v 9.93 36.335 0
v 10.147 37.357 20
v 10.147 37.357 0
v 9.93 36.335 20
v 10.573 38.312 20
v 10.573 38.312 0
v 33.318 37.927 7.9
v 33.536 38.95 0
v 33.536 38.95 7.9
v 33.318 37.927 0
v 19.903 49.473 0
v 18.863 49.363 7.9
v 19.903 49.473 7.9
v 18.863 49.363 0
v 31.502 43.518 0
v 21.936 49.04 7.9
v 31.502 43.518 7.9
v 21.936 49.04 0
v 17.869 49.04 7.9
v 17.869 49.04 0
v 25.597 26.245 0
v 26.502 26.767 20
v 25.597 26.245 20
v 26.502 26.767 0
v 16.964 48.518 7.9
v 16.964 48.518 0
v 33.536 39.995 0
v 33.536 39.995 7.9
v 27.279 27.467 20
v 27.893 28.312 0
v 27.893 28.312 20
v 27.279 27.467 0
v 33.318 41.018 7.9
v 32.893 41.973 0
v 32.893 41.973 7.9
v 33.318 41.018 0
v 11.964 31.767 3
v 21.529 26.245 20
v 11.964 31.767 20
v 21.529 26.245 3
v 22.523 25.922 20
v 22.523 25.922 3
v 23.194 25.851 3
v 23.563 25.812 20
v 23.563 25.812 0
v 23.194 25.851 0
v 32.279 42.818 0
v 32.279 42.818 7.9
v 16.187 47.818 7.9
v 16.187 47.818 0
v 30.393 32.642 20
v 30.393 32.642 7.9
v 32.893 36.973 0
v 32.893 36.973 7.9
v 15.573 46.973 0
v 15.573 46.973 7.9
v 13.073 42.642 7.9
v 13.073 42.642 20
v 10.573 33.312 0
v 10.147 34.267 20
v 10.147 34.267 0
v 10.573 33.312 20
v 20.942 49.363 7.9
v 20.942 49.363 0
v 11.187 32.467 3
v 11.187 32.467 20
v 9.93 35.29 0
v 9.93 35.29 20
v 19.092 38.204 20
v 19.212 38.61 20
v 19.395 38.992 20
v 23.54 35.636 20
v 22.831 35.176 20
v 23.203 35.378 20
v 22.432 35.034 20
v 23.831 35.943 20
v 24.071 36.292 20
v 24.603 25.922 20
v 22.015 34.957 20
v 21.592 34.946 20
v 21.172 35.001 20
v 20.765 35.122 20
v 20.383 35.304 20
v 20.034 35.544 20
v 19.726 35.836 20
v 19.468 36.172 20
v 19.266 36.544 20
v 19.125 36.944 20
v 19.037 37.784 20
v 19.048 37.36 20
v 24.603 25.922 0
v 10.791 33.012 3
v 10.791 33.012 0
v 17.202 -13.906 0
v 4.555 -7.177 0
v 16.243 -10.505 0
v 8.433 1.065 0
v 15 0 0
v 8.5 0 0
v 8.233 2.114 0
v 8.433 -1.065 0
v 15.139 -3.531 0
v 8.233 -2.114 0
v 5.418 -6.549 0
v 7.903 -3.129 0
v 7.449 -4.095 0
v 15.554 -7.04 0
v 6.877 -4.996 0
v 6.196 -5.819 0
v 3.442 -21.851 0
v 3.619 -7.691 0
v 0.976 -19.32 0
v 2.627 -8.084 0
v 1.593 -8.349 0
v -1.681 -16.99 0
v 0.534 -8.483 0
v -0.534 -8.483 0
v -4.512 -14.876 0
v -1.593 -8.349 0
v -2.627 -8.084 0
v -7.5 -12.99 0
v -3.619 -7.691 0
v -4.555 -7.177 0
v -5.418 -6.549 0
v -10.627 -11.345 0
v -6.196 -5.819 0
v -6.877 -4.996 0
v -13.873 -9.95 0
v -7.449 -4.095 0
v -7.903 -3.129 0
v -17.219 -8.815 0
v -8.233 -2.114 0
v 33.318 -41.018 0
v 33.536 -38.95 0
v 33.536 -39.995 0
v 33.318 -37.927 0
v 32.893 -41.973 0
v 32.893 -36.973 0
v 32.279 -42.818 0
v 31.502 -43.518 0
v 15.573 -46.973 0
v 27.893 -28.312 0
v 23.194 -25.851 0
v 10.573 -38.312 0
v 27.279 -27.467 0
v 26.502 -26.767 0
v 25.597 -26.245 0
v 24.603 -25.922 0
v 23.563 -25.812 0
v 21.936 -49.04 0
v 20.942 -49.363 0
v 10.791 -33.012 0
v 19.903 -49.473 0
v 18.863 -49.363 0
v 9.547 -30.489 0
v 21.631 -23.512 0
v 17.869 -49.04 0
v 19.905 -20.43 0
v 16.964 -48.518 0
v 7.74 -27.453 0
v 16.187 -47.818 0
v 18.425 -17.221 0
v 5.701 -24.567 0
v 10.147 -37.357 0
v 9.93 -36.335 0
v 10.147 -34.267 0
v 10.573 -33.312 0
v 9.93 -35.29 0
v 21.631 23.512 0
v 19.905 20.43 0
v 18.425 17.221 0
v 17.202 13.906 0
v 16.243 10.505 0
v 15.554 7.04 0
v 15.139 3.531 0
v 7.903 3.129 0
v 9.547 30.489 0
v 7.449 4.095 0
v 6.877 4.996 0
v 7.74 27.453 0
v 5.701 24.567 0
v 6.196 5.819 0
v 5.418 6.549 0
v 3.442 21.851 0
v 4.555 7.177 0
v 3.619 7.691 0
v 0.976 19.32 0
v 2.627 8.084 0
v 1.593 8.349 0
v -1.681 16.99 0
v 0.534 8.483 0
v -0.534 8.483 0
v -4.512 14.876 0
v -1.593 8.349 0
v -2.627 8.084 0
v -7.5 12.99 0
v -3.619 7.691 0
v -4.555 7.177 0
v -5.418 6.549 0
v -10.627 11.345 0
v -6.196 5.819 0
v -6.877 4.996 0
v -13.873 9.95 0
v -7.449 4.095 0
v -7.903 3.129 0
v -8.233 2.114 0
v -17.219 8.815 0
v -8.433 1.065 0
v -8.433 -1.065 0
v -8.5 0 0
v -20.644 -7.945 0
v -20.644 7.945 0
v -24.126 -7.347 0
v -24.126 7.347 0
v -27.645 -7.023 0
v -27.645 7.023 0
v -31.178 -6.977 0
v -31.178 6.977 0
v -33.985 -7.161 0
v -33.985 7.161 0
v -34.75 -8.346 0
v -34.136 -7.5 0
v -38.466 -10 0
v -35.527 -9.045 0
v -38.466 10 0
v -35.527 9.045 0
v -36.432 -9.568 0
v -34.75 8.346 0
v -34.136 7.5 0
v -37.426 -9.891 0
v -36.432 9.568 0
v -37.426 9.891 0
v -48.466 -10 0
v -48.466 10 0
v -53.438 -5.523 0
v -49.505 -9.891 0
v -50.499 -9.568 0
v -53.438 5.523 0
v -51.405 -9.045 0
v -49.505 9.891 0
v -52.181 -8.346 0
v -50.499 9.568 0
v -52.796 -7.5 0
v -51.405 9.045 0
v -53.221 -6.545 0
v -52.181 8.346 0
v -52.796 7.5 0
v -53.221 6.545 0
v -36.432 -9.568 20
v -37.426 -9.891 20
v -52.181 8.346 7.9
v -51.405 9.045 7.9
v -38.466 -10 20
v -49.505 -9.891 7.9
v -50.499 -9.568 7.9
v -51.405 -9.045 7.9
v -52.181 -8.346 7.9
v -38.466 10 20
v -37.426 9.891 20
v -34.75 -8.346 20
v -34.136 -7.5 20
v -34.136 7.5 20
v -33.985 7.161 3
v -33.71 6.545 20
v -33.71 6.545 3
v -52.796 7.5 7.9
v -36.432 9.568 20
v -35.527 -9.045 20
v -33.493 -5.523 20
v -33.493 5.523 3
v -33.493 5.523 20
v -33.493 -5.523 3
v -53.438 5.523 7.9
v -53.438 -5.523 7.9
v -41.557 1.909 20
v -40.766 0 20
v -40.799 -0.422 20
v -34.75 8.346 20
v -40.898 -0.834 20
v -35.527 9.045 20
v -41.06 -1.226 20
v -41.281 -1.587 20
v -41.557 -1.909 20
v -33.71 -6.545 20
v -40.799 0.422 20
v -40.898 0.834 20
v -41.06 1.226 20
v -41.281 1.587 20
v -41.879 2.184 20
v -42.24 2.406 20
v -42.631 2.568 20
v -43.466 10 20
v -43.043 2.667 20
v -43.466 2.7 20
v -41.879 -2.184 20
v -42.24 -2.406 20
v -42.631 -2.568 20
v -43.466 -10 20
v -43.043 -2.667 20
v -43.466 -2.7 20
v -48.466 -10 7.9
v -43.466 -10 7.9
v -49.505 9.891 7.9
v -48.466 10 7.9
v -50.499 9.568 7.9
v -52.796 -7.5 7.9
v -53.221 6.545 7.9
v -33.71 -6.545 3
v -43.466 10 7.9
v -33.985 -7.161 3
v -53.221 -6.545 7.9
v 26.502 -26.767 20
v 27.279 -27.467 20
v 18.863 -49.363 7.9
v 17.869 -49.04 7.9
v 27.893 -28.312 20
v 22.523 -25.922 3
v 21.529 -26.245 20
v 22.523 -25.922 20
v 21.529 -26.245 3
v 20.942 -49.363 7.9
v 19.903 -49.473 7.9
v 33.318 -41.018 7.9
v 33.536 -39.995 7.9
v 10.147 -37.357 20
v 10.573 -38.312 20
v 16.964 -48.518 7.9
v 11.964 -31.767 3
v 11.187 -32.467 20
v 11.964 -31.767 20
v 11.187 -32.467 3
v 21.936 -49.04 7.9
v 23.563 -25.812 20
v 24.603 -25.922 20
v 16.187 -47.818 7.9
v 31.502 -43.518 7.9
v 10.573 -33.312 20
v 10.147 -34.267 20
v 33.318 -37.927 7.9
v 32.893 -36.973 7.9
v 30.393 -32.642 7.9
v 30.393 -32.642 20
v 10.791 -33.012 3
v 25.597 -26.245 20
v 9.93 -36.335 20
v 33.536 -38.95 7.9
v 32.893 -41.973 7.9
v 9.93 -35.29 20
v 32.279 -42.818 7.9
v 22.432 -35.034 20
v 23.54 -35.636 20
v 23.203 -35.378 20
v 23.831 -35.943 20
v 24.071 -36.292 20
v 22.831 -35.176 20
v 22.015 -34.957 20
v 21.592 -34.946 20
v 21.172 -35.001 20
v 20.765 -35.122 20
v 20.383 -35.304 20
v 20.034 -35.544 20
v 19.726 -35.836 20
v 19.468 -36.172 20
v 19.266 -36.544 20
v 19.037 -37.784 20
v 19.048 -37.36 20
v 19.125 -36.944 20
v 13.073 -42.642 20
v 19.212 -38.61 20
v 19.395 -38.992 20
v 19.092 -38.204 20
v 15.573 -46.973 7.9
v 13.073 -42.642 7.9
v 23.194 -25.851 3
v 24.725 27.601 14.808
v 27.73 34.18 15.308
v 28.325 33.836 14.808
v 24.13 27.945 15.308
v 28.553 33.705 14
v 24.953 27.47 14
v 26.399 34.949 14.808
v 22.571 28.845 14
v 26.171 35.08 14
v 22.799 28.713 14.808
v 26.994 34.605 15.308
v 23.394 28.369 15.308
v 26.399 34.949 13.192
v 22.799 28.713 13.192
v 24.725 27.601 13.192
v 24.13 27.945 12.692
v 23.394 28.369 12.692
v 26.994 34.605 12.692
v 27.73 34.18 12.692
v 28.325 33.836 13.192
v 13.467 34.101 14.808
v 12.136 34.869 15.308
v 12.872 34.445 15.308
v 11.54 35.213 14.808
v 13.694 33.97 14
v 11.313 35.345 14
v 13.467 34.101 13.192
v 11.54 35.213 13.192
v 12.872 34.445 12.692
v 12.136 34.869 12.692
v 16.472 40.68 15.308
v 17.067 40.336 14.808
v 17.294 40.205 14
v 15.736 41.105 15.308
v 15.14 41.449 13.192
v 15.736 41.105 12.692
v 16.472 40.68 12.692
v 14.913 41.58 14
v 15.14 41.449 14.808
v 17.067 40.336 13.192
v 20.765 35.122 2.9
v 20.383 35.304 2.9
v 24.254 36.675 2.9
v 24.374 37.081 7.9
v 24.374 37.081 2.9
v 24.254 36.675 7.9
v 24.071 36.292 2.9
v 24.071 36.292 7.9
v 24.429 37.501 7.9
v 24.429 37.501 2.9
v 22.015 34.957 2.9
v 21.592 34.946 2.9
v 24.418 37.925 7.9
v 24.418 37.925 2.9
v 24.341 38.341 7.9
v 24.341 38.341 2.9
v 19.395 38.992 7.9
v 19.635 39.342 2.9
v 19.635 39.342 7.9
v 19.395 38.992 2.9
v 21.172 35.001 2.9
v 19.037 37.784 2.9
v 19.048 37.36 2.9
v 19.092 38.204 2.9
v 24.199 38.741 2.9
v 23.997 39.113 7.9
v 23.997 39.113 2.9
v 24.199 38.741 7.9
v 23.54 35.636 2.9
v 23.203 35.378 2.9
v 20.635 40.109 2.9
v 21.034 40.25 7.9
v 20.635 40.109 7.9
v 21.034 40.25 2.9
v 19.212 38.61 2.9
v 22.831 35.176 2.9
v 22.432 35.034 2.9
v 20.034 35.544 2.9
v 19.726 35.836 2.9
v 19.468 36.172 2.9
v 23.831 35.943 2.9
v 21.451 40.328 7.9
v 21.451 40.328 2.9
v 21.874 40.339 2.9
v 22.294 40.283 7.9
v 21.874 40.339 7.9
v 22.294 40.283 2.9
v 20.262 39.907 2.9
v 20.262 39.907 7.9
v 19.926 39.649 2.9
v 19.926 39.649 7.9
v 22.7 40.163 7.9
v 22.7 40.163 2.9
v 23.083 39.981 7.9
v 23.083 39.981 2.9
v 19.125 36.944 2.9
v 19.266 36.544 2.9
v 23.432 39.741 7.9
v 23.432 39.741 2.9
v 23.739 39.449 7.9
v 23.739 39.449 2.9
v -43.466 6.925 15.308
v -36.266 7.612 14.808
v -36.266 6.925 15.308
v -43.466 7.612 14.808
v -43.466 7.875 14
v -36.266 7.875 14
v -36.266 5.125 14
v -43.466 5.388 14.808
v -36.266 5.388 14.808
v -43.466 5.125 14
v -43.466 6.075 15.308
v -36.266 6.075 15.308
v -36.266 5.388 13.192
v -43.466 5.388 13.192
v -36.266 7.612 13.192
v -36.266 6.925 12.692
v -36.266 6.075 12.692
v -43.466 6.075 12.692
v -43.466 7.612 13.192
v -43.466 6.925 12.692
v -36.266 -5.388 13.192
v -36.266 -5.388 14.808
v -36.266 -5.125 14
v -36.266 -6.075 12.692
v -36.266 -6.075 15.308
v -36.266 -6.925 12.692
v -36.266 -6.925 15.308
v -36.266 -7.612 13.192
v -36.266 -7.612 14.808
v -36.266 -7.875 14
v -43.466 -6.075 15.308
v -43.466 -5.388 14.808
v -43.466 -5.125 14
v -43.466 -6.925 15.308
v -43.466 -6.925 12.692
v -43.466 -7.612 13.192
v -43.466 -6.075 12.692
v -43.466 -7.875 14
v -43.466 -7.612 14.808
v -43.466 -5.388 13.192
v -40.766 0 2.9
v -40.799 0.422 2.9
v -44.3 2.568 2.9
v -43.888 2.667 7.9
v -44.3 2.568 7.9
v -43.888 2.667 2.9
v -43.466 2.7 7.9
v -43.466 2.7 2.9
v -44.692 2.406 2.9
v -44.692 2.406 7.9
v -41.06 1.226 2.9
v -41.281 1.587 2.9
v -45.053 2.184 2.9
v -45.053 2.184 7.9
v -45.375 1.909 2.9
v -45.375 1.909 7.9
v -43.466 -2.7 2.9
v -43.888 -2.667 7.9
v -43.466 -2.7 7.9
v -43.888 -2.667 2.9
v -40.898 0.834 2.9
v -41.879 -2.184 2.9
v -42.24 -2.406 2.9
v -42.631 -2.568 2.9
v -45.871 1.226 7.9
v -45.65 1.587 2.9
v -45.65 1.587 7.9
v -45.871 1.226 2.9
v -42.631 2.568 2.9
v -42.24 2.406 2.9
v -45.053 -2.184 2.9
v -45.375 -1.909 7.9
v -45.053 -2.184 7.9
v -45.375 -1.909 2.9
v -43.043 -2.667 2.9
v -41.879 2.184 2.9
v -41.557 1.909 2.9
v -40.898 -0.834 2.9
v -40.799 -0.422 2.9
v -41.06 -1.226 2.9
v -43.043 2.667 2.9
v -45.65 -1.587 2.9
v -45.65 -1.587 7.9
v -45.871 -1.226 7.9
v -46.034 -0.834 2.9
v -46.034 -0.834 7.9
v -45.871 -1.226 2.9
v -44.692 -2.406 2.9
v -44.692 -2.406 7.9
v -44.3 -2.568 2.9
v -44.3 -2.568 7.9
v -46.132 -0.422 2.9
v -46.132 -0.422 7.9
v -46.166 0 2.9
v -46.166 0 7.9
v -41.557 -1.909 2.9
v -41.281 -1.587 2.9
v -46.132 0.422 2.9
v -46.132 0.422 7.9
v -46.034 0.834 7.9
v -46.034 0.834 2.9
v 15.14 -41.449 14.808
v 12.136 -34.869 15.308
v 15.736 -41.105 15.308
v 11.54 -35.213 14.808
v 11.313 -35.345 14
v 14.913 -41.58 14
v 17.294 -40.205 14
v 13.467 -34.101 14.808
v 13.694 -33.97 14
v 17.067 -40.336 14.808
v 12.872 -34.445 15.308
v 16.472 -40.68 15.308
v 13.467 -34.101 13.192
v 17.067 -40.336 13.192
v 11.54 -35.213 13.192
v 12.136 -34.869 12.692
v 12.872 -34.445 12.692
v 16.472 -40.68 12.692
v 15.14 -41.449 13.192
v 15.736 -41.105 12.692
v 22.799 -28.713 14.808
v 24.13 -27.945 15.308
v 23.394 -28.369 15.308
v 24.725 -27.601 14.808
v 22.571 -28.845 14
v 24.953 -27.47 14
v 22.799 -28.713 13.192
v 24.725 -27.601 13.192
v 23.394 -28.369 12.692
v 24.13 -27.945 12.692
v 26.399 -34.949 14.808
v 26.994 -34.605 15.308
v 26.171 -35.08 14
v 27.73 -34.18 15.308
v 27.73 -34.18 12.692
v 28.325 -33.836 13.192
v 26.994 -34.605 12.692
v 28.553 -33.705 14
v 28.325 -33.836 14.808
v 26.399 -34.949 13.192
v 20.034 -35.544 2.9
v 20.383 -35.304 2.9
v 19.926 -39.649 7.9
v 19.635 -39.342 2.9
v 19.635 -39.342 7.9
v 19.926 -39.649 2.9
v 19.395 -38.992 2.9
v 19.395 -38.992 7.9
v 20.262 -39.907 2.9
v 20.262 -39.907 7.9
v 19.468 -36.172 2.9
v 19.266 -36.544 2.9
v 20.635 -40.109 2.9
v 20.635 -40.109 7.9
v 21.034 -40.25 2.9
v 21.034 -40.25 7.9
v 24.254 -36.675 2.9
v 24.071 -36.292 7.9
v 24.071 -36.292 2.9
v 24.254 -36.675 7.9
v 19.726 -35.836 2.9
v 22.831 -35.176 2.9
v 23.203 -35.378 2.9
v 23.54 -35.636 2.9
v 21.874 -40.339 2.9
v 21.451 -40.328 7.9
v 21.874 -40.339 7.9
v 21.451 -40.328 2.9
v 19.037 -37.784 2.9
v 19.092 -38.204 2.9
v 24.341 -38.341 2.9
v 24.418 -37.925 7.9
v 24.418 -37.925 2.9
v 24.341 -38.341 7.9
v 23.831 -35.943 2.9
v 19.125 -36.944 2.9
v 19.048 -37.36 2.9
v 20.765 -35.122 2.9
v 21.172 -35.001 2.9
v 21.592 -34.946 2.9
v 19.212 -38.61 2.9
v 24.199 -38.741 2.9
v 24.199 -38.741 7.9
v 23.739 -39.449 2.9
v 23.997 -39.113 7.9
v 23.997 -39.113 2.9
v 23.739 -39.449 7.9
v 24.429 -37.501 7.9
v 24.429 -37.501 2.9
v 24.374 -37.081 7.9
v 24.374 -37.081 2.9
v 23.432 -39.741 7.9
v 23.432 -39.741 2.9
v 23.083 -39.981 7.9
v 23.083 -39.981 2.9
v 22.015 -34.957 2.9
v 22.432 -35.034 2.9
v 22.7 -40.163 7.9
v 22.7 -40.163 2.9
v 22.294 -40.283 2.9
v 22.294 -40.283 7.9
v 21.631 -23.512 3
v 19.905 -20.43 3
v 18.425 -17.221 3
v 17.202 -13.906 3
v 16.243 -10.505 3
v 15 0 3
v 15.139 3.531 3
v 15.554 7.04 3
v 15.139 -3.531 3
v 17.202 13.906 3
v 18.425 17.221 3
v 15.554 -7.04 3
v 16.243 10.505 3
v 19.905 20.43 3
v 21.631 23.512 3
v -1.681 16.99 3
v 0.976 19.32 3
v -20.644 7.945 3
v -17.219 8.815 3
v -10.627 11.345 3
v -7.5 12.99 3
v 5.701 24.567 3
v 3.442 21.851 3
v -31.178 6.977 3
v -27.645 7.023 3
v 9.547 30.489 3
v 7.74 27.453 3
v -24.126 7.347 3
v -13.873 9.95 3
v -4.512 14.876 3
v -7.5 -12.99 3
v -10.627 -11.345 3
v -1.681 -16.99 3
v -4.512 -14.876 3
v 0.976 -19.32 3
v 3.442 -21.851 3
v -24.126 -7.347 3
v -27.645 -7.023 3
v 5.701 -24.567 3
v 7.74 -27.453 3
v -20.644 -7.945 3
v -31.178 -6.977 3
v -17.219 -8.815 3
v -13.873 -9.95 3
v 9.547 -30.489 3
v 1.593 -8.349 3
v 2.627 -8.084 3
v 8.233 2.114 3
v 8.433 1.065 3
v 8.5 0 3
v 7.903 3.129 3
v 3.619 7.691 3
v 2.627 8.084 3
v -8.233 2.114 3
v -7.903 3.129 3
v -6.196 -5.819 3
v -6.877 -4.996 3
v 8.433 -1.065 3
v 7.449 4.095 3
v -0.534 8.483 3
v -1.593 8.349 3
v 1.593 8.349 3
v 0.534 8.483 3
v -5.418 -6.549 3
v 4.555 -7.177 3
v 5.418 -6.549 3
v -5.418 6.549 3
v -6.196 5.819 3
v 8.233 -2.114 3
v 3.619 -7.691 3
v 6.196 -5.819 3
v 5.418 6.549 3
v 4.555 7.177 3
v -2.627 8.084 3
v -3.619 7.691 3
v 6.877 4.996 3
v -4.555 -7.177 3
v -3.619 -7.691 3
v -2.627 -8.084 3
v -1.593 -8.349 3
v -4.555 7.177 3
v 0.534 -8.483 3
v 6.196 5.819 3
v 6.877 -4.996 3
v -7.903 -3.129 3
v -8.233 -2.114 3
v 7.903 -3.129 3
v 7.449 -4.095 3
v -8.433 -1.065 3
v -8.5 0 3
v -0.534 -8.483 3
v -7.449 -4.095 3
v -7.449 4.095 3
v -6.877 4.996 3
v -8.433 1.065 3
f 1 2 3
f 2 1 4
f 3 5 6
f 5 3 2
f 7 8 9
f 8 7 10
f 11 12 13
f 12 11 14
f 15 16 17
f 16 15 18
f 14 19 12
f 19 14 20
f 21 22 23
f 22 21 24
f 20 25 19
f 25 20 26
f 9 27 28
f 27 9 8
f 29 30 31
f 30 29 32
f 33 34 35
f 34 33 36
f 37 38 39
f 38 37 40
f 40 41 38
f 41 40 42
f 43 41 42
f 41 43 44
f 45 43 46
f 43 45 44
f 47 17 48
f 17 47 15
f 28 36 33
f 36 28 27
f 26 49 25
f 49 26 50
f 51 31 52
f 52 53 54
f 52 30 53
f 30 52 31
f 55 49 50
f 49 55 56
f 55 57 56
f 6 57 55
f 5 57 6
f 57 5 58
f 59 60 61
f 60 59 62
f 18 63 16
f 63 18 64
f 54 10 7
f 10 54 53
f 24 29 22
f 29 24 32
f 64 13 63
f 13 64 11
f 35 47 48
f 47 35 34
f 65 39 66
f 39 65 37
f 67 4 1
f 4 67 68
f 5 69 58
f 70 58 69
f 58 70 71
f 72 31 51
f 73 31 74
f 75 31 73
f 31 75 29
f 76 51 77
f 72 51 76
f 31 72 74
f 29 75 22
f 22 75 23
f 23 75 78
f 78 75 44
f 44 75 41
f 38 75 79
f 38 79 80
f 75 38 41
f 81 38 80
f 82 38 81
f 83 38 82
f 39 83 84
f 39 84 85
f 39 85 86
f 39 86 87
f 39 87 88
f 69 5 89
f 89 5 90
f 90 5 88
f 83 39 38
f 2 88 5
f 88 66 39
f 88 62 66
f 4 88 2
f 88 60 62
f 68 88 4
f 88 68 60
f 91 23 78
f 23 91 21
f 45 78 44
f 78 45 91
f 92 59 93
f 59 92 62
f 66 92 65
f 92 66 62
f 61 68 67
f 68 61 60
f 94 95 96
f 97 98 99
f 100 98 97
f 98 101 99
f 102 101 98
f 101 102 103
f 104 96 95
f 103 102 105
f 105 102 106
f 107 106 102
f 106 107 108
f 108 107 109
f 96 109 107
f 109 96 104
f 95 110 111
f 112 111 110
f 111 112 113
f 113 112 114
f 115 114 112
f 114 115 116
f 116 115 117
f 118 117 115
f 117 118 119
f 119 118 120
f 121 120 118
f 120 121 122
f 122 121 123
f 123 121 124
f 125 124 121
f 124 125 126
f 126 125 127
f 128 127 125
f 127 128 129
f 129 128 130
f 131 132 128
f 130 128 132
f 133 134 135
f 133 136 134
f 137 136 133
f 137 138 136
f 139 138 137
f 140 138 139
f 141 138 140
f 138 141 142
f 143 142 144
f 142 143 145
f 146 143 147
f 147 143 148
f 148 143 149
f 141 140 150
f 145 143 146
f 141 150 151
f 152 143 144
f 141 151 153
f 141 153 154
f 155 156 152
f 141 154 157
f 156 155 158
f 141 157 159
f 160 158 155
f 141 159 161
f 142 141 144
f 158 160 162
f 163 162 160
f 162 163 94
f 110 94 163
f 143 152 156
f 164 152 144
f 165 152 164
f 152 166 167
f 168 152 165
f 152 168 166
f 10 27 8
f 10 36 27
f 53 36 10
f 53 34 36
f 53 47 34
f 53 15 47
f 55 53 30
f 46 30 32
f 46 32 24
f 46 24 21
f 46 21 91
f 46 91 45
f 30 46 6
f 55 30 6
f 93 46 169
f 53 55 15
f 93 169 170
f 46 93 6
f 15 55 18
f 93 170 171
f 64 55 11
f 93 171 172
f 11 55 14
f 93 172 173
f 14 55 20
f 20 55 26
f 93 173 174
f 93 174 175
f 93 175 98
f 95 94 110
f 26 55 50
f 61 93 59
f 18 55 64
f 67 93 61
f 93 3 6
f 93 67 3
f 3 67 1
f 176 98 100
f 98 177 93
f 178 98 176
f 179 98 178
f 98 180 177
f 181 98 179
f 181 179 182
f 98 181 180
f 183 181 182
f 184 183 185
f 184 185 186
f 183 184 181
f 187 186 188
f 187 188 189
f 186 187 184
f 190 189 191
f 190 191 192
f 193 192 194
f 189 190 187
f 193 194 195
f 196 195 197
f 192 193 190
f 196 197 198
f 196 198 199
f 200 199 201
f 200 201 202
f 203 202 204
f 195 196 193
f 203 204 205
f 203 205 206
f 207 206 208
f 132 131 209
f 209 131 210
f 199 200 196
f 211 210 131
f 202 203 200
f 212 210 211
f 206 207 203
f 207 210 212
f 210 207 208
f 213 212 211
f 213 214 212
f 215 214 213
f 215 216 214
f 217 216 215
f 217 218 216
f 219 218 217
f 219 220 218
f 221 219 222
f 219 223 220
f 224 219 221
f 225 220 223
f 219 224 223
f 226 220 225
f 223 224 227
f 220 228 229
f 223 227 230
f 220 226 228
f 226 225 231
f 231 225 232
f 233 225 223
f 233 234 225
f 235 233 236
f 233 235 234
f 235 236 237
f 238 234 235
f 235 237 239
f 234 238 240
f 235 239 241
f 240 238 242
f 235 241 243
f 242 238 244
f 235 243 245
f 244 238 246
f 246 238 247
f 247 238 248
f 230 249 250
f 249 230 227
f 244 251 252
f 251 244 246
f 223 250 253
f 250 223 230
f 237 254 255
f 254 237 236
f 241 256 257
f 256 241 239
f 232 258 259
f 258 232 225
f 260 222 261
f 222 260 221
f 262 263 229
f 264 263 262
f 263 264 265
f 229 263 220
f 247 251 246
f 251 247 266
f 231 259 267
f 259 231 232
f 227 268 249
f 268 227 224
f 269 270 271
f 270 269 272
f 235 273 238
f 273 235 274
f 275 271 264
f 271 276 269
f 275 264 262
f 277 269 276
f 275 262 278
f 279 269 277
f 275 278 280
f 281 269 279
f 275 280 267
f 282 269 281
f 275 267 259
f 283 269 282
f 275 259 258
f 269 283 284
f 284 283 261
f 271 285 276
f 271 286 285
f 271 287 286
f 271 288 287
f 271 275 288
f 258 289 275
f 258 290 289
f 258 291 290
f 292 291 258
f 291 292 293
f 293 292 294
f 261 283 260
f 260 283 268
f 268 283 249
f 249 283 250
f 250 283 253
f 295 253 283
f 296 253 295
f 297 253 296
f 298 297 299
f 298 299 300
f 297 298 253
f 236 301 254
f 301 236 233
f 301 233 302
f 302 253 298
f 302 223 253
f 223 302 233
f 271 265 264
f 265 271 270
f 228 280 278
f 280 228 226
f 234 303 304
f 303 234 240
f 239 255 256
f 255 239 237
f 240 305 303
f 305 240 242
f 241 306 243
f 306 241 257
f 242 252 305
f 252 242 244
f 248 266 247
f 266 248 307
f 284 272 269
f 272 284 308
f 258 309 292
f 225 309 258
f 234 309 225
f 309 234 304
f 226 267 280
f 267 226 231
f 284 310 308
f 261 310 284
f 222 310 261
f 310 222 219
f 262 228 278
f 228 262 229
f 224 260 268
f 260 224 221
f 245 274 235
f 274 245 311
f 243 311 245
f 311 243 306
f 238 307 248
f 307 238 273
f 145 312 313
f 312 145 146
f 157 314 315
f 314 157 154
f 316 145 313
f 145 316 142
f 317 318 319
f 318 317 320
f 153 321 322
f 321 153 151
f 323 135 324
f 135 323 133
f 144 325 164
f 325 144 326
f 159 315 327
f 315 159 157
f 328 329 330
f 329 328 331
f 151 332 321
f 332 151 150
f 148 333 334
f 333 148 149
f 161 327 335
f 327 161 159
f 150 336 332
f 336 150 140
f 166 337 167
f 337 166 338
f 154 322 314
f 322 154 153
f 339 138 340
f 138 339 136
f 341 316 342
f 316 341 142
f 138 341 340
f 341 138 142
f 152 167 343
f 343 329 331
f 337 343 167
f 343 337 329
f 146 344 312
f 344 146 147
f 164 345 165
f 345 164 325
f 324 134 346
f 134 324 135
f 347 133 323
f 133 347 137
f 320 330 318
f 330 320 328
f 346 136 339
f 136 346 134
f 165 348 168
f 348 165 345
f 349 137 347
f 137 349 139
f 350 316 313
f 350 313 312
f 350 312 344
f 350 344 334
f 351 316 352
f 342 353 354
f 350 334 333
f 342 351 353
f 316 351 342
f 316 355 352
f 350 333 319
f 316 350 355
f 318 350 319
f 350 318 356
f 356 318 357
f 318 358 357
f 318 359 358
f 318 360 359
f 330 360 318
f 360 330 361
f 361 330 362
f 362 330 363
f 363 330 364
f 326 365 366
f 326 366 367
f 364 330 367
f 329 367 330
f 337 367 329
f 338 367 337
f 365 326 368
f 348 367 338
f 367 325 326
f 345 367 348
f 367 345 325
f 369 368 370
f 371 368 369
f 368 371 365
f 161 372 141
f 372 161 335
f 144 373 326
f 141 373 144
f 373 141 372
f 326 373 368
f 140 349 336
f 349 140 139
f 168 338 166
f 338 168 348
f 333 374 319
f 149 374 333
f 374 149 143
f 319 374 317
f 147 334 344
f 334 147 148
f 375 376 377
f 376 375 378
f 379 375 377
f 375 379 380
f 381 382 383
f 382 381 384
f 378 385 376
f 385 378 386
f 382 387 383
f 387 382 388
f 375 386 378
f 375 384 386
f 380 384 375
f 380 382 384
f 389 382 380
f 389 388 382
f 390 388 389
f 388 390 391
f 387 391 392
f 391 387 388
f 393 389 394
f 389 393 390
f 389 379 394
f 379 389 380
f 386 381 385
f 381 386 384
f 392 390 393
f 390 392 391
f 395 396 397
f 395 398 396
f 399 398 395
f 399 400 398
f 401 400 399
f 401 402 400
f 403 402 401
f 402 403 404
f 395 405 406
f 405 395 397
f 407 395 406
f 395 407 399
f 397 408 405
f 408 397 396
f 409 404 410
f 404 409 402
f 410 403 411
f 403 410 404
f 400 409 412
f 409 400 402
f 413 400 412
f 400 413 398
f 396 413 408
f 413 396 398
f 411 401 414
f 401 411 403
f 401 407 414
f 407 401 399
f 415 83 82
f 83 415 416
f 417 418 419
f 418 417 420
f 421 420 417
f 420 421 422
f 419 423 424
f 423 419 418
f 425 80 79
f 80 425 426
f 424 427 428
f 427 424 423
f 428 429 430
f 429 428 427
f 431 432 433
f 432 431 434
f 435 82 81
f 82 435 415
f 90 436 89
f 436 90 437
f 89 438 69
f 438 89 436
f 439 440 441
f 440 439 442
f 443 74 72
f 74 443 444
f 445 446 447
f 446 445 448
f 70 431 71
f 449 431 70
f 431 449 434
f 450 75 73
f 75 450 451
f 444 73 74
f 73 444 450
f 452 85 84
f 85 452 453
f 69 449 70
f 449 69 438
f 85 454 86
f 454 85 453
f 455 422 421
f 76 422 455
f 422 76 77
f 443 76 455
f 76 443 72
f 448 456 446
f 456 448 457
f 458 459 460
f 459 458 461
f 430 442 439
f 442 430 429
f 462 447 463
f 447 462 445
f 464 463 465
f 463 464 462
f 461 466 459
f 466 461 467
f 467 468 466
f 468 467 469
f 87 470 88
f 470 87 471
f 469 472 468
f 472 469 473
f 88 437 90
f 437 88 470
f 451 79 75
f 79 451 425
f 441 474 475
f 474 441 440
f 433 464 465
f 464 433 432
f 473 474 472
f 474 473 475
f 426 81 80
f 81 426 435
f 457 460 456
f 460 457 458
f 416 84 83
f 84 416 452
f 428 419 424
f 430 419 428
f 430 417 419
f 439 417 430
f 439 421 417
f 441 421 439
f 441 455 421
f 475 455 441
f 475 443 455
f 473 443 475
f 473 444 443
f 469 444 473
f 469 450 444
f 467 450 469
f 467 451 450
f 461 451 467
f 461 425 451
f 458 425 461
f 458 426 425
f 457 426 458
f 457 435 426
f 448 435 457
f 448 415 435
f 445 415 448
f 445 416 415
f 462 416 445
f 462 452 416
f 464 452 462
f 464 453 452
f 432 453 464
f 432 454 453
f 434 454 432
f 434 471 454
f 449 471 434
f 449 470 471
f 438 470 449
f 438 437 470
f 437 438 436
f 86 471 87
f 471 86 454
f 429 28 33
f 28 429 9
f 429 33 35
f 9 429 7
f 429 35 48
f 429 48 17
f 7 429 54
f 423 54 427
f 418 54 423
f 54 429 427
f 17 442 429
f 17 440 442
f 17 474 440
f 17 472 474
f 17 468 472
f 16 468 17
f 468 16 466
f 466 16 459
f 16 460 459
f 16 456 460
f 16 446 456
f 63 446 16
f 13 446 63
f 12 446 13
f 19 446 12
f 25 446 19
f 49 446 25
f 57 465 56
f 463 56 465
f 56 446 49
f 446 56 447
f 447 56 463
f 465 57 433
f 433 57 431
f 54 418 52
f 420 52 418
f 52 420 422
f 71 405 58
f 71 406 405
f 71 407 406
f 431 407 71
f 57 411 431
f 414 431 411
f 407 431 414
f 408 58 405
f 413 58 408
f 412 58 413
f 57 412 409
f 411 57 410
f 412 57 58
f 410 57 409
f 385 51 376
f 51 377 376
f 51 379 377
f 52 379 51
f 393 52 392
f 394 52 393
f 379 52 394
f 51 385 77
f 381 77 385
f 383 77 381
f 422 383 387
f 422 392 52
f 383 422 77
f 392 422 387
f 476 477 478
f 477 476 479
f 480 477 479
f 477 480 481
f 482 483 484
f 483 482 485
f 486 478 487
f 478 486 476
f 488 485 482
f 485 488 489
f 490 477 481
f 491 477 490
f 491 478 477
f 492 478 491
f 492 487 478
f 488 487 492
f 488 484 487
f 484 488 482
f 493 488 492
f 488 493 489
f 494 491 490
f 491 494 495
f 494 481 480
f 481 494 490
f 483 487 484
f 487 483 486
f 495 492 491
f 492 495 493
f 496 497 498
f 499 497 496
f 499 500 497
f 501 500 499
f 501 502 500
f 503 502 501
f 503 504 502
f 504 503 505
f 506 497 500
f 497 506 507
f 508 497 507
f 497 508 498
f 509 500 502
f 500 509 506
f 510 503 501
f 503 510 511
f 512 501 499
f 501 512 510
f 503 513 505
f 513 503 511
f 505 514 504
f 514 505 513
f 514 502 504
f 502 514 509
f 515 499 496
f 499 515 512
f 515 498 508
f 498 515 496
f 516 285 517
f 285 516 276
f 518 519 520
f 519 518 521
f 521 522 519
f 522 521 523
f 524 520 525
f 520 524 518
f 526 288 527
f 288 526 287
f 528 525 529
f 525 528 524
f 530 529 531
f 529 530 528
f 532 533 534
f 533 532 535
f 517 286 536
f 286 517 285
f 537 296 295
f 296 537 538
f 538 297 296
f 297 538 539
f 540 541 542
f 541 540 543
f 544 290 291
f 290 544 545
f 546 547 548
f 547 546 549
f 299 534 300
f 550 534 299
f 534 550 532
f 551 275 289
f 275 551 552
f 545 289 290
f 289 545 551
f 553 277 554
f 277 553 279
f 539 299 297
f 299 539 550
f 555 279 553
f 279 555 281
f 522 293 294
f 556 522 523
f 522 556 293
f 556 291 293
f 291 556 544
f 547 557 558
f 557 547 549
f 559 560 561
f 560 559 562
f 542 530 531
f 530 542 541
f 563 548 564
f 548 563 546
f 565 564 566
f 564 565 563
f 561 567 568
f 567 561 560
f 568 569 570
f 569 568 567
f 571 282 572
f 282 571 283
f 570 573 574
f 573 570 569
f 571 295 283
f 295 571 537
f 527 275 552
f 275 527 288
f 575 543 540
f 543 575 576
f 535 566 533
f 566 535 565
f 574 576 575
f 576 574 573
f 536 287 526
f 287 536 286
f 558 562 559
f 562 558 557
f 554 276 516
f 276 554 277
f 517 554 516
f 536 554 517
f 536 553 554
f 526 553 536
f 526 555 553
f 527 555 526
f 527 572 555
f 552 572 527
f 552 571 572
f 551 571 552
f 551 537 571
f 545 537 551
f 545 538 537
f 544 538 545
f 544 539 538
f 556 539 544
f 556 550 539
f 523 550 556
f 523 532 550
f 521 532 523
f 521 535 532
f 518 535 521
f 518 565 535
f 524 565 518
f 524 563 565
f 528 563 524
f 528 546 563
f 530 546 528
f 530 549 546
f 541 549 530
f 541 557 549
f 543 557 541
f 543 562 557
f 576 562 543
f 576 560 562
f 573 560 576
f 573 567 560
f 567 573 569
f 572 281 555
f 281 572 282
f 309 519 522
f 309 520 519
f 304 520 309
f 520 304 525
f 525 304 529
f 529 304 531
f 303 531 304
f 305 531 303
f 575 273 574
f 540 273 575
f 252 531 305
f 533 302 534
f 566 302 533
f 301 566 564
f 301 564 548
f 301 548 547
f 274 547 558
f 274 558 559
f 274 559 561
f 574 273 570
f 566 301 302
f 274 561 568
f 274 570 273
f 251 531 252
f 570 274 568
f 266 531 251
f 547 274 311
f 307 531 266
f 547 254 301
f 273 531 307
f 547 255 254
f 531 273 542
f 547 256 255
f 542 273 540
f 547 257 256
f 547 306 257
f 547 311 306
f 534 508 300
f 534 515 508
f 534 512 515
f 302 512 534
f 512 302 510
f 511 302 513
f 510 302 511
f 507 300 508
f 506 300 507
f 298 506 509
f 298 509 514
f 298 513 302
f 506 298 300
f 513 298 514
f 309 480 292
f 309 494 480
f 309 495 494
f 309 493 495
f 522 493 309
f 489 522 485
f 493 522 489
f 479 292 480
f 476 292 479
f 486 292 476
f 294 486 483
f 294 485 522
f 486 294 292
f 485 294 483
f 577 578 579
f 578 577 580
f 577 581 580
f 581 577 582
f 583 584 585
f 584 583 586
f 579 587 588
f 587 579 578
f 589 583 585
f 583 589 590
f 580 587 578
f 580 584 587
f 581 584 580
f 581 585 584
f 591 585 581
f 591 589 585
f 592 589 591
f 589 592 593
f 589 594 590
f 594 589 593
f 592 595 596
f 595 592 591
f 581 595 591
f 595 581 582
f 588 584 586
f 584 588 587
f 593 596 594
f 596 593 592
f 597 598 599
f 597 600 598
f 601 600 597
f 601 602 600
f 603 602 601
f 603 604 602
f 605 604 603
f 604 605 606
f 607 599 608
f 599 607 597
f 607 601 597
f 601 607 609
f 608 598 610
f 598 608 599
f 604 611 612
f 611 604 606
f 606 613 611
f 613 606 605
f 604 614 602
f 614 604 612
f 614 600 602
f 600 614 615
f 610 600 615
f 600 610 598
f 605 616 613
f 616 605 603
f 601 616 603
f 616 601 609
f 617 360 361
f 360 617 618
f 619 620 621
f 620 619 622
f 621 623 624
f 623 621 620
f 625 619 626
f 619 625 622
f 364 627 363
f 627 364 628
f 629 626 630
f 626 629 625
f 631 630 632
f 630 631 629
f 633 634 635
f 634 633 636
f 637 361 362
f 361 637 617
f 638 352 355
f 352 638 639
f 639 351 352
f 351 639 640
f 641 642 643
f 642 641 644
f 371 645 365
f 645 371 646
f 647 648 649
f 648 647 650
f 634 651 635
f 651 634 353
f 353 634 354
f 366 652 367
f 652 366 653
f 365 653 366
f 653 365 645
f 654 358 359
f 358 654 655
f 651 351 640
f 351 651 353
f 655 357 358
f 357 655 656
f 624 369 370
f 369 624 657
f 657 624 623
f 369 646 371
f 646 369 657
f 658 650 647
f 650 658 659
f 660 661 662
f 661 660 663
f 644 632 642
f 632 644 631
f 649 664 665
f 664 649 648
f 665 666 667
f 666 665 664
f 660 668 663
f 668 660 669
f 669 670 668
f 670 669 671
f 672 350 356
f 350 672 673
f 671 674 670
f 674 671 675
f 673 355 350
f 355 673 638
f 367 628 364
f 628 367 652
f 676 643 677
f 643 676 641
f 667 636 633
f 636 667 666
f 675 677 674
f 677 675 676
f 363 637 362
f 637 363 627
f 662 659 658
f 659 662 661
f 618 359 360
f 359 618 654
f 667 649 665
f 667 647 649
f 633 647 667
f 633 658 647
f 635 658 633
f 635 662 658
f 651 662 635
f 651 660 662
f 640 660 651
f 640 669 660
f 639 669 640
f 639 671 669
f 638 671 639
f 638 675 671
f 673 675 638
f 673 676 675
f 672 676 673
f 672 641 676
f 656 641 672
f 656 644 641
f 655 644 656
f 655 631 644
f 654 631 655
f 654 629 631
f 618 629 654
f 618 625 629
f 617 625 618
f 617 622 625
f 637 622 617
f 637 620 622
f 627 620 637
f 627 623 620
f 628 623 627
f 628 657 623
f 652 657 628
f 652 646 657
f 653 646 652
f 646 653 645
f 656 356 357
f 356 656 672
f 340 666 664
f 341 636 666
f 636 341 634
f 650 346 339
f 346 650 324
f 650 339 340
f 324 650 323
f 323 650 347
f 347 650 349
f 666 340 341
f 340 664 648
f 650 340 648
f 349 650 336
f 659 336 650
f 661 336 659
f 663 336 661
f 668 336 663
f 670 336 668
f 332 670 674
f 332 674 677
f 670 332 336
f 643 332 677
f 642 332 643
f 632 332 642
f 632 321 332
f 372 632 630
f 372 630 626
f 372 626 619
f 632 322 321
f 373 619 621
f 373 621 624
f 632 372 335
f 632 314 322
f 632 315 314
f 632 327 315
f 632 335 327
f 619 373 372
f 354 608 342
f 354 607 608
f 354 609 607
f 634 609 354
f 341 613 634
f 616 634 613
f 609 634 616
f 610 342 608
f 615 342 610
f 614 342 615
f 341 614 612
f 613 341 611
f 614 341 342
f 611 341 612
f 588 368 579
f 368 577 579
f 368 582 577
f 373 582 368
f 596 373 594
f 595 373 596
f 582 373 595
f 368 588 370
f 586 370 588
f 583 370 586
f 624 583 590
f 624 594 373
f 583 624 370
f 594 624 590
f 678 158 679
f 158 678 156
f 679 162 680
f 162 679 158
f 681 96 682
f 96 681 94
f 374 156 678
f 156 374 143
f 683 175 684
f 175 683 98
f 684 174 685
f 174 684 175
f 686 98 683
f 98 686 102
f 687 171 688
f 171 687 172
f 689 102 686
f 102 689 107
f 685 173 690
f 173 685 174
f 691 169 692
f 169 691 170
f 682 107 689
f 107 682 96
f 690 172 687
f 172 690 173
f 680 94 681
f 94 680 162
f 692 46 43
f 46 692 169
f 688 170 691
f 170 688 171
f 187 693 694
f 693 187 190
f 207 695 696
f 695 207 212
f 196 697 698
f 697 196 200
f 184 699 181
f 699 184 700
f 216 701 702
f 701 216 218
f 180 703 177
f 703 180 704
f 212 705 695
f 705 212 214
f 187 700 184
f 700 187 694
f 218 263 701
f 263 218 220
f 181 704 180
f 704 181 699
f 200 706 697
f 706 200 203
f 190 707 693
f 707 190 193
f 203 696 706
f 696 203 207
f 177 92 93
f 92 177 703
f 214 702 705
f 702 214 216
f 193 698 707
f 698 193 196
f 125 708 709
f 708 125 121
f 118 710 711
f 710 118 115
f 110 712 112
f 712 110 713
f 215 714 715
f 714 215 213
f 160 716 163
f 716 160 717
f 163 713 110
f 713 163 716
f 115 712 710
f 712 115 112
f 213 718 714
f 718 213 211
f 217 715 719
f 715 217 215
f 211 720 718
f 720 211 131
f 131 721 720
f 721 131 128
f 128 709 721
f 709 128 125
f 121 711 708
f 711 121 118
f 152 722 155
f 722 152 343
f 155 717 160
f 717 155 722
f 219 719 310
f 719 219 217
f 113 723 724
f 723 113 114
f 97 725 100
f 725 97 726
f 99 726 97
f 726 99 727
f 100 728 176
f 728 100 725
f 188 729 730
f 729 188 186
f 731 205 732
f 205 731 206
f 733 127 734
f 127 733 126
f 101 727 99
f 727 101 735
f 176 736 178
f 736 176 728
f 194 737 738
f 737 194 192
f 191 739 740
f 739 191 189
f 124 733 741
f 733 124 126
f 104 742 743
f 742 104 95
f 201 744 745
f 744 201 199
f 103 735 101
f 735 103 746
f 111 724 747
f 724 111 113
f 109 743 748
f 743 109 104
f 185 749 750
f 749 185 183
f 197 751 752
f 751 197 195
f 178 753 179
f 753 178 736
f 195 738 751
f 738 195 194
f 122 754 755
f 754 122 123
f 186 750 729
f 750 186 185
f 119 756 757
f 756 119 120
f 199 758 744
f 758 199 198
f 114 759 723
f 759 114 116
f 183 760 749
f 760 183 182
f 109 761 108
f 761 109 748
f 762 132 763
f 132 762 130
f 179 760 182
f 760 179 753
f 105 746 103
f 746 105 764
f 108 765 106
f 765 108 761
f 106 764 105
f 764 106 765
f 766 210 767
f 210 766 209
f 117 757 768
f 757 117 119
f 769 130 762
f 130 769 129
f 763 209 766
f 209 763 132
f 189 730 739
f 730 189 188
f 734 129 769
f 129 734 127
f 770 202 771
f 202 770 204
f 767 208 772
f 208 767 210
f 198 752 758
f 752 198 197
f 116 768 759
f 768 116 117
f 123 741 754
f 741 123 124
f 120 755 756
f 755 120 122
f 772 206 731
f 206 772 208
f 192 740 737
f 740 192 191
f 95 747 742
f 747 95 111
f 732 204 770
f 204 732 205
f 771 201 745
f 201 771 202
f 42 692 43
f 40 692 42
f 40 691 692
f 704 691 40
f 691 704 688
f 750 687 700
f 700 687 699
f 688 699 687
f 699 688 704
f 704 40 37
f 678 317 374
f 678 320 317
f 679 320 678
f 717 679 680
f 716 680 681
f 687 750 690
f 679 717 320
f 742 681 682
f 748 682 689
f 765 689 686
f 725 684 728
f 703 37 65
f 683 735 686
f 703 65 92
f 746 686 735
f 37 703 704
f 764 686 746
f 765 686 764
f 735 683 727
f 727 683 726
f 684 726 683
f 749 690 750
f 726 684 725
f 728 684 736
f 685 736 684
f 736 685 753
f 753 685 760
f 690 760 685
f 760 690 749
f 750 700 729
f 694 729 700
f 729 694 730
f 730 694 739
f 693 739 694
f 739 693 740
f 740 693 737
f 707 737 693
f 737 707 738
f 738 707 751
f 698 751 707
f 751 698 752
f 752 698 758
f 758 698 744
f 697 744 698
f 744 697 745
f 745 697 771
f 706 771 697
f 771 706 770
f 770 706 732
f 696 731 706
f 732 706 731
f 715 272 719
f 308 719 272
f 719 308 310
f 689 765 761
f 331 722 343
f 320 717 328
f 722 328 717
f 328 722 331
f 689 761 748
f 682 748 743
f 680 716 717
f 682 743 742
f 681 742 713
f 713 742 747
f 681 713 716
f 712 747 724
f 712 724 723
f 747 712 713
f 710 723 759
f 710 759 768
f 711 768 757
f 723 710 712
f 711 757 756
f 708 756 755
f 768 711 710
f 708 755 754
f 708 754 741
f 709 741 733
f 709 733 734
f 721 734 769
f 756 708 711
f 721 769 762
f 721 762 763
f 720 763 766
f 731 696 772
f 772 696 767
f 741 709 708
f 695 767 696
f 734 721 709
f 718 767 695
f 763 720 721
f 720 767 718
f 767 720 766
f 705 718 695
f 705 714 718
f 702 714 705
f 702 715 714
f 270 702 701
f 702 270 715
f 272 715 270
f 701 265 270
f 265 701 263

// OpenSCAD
// file: lib/stepper.scad
smWidth = 42;
smLength = 40;
smScrewHoleOffsets = 31/2;
smCenterDiameter = 22;
smExtra = 1;

module stepperMotor() {
    smCenterHeight = 2;
    smShaftDiameter = 5;
    smShaftLength = 23;
    smScrewDepth = 4.5;
    smScrewDiameter = 3;
    smEdgeTrimOffset = 27;
    module add() {
        translate([-smWidth/2, -smLength, -smWidth/2]) {
            cube([smWidth, smLength, smWidth]);
        }
        rotate([-90, 0, 0]) {
            cylinder(d=smCenterDiameter, h=smCenterHeight, $fn=30);
            cylinder(d=smShaftDiameter, h=smShaftLength, $fn=20);
        }
    }
    module del() {
        for (x = [smScrewHoleOffsets, -smScrewHoleOffsets]) {
            for (z = [smScrewHoleOffsets, -smScrewHoleOffsets]) {
                translate([x, iota, z]) {
                    rotate([90, 0, 0]) {
                        cylinder(d=smScrewDiameter, h=smScrewDepth, $fn=40);
                    }
                }
            }
        }
        for (a = [45, 135, 225, 315]) {
            rotate([0, a, 0]) {
                translate([smEdgeTrimOffset,
                        -smLength-iota, -smWidth/2-iota]) {
                    cube([smWidth, smLength+2*iota, smWidth+2*iota]);
                }
            }
        }

    }
    difference() {
        add();
        del();
    }
}

module stepperMotorHole() {
    smHoleHeight = 20;
    smScrewHoleDiameter = 4;

    widthPlusExtra = smWidth + smExtra;
    lengthPlusExtra = smLength + smExtra/2;

    translate([-smWidth/2, -lengthPlusExtra, -widthPlusExtra/2]) {
        cube([smWidth, lengthPlusExtra, widthPlusExtra]);
    }
    translate([0, -iota, 0]) {
        rotate([-90, 0, 0]) {
            cylinder(d=smCenterDiameter+smExtra, h=smHoleHeight, $fn=40);
        }
    }
    for (x = [smScrewHoleOffsets, -smScrewHoleOffsets]) {
        for (z = [smScrewHoleOffsets, -smScrewHoleOffsets]) {
            translate([x, smHoleHeight-iota, z]) {
                rotate([90, 0, 0]) {
                    cylinder(d=smScrewHoleDiameter, h=smHoleHeight, $fn=40);
                }
            }
        }
    }

}
// file: lib/commonConstants.scad
// A small quantity to keep parts from starting or ending at exactly the
// same location. For example when we create a hole through an object we
// want the object being subtracted to stick slightly past the object being
// subtracted from.
iota = 0.1;


// Length and hole diameter of the #4 x 3/8in Phillips mount screw.
screwLength = 9.3;
screwHoleDiameter = 2.75;
screwHeadDiameter = 6.5;
screwBodyDiameter = 3.4;


// These constants are the basic parameters of the mount plate. They are
// necessary for other components to make their calculations.
mountPlateWidth = 37.6;
mountPlateLength = 51;


// These constants are the basis for the carbon fiber mount points. They are
// necessary for other components to make their calculations.
mountRodDiameter = 5.5;         // A little extra because holes are smaller.
mountThickness = 9;
mountDiameter = mountRodDiameter + 2*mountThickness;


// These constasnts are teh basis for the motor base. They are necessary for
// other components to make their calculations.
motorBaseExtraAxisOffset = 5;
motorBaseTopOffset = sqrt(3)*mountPlateWidth/6 + motorBaseExtraAxisOffset;
motorBaseBottomOffset = mountPlateLength/sqrt(2) + motorBaseTopOffset;
motorBaseBottomRadius = sqrt(pow(motorBaseBottomOffset,2) +
                             pow(mountPlateWidth/2, 2));
mountBaseRodOffsets = motorBaseBottomRadius-mountDiameter/2;
// main file
include <lib/commonConstants.scad>;
include <lib/stepper.scad>;
include <lib/commonMounts.scad>;

topMount();
